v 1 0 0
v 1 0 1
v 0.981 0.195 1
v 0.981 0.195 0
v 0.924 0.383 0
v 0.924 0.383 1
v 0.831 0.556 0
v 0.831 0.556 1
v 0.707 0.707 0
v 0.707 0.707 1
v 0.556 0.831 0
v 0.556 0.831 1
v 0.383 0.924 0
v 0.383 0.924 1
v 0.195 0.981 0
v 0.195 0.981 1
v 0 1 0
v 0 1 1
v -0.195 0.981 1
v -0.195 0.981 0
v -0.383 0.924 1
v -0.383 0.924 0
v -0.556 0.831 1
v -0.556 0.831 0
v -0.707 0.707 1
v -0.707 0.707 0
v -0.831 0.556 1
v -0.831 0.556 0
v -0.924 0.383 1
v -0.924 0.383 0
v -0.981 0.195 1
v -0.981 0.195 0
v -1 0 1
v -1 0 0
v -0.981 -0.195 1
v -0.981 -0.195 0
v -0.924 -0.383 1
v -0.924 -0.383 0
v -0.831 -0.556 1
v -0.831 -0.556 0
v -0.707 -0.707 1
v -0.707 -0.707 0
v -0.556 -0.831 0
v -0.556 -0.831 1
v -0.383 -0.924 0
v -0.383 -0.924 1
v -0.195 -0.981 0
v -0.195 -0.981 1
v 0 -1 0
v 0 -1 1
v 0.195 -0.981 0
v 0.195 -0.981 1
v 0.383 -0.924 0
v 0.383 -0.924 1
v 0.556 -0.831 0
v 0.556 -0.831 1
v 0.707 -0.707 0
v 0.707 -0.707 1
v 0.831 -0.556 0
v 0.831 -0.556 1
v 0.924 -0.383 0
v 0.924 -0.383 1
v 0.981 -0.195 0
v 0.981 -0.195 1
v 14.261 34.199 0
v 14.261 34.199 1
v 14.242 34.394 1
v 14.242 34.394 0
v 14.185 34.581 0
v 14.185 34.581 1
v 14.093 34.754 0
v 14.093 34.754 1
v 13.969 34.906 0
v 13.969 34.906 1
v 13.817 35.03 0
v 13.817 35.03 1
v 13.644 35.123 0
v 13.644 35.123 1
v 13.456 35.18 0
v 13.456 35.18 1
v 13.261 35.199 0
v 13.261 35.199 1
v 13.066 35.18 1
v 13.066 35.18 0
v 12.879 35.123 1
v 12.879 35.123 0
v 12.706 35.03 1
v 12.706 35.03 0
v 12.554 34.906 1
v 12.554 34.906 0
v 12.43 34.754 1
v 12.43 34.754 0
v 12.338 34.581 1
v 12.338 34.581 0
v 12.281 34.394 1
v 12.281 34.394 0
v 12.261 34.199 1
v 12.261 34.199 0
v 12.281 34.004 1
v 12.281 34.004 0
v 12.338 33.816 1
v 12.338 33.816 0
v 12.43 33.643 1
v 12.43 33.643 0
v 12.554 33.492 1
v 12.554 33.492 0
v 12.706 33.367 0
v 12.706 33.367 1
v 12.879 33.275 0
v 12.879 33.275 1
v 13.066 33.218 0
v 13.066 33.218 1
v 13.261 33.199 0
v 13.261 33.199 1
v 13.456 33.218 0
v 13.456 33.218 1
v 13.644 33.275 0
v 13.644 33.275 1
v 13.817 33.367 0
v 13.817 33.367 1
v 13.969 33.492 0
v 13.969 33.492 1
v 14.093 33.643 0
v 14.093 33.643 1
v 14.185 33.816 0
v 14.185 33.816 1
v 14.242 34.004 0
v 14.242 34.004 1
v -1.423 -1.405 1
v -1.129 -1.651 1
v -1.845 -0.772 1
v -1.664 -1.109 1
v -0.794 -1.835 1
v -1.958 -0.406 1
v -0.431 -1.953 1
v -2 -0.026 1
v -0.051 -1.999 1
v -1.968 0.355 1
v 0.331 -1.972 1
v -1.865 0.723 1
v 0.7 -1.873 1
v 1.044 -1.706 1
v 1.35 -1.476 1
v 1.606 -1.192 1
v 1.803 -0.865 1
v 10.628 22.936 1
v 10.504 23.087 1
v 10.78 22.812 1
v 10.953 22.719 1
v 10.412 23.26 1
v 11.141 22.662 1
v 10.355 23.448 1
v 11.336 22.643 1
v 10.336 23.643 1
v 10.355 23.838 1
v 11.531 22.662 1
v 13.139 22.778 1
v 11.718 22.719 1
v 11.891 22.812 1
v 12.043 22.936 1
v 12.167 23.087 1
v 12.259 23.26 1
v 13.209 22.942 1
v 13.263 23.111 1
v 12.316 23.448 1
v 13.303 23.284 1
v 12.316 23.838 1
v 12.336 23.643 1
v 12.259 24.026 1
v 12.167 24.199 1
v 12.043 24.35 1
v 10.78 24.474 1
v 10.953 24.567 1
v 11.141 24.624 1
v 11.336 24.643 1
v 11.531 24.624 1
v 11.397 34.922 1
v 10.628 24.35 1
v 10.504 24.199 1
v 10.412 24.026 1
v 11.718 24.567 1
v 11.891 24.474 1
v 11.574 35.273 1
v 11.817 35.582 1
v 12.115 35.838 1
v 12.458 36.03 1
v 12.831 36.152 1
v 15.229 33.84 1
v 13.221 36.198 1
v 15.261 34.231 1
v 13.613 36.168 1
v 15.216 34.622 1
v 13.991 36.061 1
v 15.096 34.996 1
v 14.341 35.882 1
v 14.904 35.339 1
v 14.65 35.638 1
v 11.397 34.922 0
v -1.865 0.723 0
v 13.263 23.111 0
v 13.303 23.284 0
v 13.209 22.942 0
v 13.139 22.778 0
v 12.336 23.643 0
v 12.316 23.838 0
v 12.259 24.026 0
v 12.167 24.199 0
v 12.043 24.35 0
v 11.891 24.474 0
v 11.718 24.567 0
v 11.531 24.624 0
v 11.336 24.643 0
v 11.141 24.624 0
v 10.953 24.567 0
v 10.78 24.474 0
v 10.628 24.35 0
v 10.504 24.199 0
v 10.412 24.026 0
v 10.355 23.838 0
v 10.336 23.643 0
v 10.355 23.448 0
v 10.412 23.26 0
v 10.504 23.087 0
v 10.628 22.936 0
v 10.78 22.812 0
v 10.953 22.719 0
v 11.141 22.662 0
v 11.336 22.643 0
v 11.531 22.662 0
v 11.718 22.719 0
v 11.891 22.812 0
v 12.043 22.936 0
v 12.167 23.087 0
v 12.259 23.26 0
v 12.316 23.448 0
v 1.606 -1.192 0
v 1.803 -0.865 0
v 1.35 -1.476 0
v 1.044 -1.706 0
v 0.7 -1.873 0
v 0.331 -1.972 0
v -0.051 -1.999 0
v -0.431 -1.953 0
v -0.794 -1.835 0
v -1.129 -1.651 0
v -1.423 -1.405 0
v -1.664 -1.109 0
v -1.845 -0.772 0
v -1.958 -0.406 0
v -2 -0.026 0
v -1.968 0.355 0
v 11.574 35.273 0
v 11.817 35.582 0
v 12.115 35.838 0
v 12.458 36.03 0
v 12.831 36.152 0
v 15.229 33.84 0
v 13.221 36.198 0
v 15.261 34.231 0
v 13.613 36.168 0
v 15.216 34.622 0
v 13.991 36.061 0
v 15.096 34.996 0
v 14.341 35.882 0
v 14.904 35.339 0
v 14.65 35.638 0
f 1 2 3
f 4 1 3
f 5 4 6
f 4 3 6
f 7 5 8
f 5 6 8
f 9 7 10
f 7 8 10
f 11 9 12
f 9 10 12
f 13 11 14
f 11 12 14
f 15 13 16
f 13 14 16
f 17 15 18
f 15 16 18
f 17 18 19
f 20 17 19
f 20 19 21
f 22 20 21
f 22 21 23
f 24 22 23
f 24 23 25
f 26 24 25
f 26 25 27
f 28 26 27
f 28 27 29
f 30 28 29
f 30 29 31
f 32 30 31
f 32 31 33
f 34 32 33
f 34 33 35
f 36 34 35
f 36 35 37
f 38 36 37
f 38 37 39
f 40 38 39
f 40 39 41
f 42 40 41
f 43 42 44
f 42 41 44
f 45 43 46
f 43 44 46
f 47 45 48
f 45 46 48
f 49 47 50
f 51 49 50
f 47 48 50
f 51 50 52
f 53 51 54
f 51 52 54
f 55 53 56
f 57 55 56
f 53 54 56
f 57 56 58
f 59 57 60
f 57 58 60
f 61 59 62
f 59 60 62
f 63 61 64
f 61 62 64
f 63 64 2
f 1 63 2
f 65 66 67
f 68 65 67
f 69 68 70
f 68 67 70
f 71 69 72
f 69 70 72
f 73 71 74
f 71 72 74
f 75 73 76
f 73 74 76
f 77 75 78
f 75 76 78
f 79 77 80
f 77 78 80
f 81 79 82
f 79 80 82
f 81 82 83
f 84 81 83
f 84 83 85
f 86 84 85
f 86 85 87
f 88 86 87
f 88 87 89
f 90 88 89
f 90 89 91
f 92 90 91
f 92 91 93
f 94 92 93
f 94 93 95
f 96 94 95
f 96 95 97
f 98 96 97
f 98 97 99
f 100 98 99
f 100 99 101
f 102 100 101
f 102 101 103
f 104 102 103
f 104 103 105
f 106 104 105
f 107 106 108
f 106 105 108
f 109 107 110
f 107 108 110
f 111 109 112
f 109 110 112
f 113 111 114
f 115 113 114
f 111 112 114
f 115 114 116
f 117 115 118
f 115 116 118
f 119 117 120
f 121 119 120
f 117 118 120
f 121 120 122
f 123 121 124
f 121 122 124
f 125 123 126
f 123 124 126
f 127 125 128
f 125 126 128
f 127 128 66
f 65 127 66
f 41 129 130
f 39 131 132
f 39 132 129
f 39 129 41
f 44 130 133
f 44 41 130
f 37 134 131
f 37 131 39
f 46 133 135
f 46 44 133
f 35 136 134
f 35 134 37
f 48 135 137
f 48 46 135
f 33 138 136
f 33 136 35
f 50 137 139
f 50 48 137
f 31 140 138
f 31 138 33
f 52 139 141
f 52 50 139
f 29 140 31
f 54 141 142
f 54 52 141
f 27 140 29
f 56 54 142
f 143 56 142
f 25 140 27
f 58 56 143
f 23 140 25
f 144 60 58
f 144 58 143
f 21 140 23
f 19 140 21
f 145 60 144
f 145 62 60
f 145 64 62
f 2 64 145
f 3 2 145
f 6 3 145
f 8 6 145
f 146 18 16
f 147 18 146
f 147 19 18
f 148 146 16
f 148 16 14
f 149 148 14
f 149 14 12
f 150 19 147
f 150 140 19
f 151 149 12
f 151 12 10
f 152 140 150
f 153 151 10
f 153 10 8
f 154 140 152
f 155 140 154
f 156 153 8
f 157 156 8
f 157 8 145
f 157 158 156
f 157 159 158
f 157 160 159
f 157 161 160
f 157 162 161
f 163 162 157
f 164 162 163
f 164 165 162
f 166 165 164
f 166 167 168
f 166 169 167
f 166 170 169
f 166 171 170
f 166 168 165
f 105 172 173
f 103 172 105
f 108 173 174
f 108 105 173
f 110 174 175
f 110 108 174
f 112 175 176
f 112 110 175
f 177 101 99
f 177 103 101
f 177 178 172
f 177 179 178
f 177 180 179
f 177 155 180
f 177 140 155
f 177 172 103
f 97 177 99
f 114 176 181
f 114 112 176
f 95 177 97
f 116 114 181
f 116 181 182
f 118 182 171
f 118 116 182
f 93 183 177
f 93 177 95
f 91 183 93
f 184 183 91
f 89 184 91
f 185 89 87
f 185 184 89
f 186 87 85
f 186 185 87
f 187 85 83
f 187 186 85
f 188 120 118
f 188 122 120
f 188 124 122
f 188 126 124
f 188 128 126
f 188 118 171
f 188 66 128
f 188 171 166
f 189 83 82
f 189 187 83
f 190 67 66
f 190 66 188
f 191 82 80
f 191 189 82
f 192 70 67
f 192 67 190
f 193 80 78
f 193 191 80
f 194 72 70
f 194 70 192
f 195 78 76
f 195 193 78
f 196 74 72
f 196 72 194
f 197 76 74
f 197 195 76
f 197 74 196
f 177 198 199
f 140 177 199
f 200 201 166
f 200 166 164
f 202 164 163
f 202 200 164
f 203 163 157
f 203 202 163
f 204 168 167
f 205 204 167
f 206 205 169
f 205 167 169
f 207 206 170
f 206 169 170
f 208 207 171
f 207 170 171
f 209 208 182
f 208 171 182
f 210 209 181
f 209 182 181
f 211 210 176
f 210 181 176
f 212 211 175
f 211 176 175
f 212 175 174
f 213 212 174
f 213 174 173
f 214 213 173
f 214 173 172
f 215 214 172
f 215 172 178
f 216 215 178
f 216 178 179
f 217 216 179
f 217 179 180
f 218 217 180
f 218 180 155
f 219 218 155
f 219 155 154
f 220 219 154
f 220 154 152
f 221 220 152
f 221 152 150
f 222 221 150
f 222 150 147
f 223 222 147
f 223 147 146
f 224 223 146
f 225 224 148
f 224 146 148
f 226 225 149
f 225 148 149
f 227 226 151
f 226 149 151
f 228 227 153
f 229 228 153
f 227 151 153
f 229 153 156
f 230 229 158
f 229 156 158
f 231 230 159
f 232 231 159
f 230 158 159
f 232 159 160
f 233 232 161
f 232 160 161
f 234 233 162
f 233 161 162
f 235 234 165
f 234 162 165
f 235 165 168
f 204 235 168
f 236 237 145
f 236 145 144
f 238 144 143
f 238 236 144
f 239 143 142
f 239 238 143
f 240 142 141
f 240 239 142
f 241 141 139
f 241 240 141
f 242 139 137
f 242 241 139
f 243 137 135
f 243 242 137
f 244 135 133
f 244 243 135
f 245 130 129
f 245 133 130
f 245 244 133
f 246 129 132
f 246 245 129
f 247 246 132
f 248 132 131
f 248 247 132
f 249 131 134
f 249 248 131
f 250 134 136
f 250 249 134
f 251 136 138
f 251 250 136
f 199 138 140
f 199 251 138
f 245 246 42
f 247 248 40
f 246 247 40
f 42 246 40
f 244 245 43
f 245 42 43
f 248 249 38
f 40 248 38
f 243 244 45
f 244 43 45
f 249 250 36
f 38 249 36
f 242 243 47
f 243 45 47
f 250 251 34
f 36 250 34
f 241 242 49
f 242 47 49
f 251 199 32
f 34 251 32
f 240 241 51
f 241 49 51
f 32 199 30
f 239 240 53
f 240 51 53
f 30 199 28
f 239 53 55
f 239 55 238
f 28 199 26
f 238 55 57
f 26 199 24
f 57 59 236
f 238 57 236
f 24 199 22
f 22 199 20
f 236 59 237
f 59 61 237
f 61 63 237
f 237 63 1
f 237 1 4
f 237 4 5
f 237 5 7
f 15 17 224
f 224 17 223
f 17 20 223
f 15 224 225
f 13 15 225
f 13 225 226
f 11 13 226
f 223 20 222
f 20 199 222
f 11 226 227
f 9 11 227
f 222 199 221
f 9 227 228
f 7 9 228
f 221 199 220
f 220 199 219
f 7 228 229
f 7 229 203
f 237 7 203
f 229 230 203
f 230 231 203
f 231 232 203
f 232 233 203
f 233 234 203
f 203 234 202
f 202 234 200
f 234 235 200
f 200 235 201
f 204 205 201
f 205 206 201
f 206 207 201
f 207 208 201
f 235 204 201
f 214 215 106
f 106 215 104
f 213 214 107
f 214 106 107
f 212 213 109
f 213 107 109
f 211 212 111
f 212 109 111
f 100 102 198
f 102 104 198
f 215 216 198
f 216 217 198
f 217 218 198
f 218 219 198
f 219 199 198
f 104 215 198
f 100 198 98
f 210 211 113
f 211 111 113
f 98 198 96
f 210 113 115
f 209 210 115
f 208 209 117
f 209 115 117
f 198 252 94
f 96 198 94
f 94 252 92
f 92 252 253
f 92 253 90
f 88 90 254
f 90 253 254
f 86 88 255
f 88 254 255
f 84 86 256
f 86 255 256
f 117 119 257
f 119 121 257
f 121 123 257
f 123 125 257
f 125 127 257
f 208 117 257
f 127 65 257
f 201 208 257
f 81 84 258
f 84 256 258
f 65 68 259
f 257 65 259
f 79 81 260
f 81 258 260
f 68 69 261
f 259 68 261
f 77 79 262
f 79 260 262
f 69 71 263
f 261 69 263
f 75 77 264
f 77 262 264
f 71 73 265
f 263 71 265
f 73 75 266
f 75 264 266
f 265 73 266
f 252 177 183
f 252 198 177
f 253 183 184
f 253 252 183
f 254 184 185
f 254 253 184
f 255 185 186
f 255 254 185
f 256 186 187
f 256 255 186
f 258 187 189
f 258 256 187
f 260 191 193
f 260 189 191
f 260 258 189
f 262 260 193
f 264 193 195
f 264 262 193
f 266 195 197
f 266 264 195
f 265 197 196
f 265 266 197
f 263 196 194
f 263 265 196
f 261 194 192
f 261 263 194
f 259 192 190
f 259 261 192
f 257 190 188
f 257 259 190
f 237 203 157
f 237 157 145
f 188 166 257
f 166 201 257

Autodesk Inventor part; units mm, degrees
ref_plane "YZ Plane" through (0, 0, 0) normal (1, 0, 0) x (0, 1, 0)
ref_plane "XZ Plane" through (0, 0, 0) normal (0, 1, 0) x (-1, 0, 0)
ref_plane "XY Plane" through (0, 0, 0) normal (0, 0, 1) x (1, 0, 0)
sketch "草圖1" plane through (0, 0, 0) normal (0, 0, 1) x (1, 0, 0)
  line L0 (0, 0) -> (13.2614, 34.1988)
  line L1 (11.3356, 23.643) -> (10.4709, 21.8396)
  line L2 (11.3967, 34.9219) -> (-1.8647, 0.7231)
  line L3 (13.255, 23.0202) -> (1.8034, -0.8647)
  line L4 (13.2272, 22.8679) -> (15.2289, 33.8398)
  arc A0 (13.139, 22.7784) -> (13.3031, 23.2841) centre (11.3356, 23.643) ccw
  arc A1 (15.2289, 33.8398) -> (11.3967, 34.9219) centre (13.2614, 34.1988) ccw
  arc A2 (12.5383, 32.3341) -> (12.9025, 32.2313) centre (13.2614, 34.1988) ccw
  arc A3 (0.8647, 1.8034) -> (0.7231, 1.8647) centre (0, 0) ccw
  arc A4 (-1.8647, 0.7231) -> (1.8034, -0.8647) centre (0, 0) ccw
  dimension "d0" = 10.73
  dimension "d1" = 26.22
  dimension "d2" = 36.68
extrude "擠出1" add sketch "草圖1" along normal blind 1 contours A1 L4 A0 L3 A4 L2
sketch "草圖2" plane through (0, 0, 1) normal (0, 0, 1) x (1, 0, 0)
  arc A0 (13.139, 22.7784) -> (13.3031, 23.2841) centre (11.3356, 23.643) ccw projected
  circle A1 centre (11.3356, 23.643) radius 1
  arc A2 (15.2289, 33.8398) -> (11.3967, 34.9219) centre (13.2614, 34.1988) ccw projected
  circle A3 centre (13.2614, 34.1988) radius 1
  arc A4 (-1.8647, 0.7231) -> (1.8034, -0.8647) centre (0, 0) ccw projected
  circle A5 centre (0, 0) radius 1
  dimension "d8" = 2
  dimension "d9" = 2
  dimension "d10" = 2
extrude "擠出2" cut sketch "草圖2" against normal blind 10
properties part number "三角塊3"
